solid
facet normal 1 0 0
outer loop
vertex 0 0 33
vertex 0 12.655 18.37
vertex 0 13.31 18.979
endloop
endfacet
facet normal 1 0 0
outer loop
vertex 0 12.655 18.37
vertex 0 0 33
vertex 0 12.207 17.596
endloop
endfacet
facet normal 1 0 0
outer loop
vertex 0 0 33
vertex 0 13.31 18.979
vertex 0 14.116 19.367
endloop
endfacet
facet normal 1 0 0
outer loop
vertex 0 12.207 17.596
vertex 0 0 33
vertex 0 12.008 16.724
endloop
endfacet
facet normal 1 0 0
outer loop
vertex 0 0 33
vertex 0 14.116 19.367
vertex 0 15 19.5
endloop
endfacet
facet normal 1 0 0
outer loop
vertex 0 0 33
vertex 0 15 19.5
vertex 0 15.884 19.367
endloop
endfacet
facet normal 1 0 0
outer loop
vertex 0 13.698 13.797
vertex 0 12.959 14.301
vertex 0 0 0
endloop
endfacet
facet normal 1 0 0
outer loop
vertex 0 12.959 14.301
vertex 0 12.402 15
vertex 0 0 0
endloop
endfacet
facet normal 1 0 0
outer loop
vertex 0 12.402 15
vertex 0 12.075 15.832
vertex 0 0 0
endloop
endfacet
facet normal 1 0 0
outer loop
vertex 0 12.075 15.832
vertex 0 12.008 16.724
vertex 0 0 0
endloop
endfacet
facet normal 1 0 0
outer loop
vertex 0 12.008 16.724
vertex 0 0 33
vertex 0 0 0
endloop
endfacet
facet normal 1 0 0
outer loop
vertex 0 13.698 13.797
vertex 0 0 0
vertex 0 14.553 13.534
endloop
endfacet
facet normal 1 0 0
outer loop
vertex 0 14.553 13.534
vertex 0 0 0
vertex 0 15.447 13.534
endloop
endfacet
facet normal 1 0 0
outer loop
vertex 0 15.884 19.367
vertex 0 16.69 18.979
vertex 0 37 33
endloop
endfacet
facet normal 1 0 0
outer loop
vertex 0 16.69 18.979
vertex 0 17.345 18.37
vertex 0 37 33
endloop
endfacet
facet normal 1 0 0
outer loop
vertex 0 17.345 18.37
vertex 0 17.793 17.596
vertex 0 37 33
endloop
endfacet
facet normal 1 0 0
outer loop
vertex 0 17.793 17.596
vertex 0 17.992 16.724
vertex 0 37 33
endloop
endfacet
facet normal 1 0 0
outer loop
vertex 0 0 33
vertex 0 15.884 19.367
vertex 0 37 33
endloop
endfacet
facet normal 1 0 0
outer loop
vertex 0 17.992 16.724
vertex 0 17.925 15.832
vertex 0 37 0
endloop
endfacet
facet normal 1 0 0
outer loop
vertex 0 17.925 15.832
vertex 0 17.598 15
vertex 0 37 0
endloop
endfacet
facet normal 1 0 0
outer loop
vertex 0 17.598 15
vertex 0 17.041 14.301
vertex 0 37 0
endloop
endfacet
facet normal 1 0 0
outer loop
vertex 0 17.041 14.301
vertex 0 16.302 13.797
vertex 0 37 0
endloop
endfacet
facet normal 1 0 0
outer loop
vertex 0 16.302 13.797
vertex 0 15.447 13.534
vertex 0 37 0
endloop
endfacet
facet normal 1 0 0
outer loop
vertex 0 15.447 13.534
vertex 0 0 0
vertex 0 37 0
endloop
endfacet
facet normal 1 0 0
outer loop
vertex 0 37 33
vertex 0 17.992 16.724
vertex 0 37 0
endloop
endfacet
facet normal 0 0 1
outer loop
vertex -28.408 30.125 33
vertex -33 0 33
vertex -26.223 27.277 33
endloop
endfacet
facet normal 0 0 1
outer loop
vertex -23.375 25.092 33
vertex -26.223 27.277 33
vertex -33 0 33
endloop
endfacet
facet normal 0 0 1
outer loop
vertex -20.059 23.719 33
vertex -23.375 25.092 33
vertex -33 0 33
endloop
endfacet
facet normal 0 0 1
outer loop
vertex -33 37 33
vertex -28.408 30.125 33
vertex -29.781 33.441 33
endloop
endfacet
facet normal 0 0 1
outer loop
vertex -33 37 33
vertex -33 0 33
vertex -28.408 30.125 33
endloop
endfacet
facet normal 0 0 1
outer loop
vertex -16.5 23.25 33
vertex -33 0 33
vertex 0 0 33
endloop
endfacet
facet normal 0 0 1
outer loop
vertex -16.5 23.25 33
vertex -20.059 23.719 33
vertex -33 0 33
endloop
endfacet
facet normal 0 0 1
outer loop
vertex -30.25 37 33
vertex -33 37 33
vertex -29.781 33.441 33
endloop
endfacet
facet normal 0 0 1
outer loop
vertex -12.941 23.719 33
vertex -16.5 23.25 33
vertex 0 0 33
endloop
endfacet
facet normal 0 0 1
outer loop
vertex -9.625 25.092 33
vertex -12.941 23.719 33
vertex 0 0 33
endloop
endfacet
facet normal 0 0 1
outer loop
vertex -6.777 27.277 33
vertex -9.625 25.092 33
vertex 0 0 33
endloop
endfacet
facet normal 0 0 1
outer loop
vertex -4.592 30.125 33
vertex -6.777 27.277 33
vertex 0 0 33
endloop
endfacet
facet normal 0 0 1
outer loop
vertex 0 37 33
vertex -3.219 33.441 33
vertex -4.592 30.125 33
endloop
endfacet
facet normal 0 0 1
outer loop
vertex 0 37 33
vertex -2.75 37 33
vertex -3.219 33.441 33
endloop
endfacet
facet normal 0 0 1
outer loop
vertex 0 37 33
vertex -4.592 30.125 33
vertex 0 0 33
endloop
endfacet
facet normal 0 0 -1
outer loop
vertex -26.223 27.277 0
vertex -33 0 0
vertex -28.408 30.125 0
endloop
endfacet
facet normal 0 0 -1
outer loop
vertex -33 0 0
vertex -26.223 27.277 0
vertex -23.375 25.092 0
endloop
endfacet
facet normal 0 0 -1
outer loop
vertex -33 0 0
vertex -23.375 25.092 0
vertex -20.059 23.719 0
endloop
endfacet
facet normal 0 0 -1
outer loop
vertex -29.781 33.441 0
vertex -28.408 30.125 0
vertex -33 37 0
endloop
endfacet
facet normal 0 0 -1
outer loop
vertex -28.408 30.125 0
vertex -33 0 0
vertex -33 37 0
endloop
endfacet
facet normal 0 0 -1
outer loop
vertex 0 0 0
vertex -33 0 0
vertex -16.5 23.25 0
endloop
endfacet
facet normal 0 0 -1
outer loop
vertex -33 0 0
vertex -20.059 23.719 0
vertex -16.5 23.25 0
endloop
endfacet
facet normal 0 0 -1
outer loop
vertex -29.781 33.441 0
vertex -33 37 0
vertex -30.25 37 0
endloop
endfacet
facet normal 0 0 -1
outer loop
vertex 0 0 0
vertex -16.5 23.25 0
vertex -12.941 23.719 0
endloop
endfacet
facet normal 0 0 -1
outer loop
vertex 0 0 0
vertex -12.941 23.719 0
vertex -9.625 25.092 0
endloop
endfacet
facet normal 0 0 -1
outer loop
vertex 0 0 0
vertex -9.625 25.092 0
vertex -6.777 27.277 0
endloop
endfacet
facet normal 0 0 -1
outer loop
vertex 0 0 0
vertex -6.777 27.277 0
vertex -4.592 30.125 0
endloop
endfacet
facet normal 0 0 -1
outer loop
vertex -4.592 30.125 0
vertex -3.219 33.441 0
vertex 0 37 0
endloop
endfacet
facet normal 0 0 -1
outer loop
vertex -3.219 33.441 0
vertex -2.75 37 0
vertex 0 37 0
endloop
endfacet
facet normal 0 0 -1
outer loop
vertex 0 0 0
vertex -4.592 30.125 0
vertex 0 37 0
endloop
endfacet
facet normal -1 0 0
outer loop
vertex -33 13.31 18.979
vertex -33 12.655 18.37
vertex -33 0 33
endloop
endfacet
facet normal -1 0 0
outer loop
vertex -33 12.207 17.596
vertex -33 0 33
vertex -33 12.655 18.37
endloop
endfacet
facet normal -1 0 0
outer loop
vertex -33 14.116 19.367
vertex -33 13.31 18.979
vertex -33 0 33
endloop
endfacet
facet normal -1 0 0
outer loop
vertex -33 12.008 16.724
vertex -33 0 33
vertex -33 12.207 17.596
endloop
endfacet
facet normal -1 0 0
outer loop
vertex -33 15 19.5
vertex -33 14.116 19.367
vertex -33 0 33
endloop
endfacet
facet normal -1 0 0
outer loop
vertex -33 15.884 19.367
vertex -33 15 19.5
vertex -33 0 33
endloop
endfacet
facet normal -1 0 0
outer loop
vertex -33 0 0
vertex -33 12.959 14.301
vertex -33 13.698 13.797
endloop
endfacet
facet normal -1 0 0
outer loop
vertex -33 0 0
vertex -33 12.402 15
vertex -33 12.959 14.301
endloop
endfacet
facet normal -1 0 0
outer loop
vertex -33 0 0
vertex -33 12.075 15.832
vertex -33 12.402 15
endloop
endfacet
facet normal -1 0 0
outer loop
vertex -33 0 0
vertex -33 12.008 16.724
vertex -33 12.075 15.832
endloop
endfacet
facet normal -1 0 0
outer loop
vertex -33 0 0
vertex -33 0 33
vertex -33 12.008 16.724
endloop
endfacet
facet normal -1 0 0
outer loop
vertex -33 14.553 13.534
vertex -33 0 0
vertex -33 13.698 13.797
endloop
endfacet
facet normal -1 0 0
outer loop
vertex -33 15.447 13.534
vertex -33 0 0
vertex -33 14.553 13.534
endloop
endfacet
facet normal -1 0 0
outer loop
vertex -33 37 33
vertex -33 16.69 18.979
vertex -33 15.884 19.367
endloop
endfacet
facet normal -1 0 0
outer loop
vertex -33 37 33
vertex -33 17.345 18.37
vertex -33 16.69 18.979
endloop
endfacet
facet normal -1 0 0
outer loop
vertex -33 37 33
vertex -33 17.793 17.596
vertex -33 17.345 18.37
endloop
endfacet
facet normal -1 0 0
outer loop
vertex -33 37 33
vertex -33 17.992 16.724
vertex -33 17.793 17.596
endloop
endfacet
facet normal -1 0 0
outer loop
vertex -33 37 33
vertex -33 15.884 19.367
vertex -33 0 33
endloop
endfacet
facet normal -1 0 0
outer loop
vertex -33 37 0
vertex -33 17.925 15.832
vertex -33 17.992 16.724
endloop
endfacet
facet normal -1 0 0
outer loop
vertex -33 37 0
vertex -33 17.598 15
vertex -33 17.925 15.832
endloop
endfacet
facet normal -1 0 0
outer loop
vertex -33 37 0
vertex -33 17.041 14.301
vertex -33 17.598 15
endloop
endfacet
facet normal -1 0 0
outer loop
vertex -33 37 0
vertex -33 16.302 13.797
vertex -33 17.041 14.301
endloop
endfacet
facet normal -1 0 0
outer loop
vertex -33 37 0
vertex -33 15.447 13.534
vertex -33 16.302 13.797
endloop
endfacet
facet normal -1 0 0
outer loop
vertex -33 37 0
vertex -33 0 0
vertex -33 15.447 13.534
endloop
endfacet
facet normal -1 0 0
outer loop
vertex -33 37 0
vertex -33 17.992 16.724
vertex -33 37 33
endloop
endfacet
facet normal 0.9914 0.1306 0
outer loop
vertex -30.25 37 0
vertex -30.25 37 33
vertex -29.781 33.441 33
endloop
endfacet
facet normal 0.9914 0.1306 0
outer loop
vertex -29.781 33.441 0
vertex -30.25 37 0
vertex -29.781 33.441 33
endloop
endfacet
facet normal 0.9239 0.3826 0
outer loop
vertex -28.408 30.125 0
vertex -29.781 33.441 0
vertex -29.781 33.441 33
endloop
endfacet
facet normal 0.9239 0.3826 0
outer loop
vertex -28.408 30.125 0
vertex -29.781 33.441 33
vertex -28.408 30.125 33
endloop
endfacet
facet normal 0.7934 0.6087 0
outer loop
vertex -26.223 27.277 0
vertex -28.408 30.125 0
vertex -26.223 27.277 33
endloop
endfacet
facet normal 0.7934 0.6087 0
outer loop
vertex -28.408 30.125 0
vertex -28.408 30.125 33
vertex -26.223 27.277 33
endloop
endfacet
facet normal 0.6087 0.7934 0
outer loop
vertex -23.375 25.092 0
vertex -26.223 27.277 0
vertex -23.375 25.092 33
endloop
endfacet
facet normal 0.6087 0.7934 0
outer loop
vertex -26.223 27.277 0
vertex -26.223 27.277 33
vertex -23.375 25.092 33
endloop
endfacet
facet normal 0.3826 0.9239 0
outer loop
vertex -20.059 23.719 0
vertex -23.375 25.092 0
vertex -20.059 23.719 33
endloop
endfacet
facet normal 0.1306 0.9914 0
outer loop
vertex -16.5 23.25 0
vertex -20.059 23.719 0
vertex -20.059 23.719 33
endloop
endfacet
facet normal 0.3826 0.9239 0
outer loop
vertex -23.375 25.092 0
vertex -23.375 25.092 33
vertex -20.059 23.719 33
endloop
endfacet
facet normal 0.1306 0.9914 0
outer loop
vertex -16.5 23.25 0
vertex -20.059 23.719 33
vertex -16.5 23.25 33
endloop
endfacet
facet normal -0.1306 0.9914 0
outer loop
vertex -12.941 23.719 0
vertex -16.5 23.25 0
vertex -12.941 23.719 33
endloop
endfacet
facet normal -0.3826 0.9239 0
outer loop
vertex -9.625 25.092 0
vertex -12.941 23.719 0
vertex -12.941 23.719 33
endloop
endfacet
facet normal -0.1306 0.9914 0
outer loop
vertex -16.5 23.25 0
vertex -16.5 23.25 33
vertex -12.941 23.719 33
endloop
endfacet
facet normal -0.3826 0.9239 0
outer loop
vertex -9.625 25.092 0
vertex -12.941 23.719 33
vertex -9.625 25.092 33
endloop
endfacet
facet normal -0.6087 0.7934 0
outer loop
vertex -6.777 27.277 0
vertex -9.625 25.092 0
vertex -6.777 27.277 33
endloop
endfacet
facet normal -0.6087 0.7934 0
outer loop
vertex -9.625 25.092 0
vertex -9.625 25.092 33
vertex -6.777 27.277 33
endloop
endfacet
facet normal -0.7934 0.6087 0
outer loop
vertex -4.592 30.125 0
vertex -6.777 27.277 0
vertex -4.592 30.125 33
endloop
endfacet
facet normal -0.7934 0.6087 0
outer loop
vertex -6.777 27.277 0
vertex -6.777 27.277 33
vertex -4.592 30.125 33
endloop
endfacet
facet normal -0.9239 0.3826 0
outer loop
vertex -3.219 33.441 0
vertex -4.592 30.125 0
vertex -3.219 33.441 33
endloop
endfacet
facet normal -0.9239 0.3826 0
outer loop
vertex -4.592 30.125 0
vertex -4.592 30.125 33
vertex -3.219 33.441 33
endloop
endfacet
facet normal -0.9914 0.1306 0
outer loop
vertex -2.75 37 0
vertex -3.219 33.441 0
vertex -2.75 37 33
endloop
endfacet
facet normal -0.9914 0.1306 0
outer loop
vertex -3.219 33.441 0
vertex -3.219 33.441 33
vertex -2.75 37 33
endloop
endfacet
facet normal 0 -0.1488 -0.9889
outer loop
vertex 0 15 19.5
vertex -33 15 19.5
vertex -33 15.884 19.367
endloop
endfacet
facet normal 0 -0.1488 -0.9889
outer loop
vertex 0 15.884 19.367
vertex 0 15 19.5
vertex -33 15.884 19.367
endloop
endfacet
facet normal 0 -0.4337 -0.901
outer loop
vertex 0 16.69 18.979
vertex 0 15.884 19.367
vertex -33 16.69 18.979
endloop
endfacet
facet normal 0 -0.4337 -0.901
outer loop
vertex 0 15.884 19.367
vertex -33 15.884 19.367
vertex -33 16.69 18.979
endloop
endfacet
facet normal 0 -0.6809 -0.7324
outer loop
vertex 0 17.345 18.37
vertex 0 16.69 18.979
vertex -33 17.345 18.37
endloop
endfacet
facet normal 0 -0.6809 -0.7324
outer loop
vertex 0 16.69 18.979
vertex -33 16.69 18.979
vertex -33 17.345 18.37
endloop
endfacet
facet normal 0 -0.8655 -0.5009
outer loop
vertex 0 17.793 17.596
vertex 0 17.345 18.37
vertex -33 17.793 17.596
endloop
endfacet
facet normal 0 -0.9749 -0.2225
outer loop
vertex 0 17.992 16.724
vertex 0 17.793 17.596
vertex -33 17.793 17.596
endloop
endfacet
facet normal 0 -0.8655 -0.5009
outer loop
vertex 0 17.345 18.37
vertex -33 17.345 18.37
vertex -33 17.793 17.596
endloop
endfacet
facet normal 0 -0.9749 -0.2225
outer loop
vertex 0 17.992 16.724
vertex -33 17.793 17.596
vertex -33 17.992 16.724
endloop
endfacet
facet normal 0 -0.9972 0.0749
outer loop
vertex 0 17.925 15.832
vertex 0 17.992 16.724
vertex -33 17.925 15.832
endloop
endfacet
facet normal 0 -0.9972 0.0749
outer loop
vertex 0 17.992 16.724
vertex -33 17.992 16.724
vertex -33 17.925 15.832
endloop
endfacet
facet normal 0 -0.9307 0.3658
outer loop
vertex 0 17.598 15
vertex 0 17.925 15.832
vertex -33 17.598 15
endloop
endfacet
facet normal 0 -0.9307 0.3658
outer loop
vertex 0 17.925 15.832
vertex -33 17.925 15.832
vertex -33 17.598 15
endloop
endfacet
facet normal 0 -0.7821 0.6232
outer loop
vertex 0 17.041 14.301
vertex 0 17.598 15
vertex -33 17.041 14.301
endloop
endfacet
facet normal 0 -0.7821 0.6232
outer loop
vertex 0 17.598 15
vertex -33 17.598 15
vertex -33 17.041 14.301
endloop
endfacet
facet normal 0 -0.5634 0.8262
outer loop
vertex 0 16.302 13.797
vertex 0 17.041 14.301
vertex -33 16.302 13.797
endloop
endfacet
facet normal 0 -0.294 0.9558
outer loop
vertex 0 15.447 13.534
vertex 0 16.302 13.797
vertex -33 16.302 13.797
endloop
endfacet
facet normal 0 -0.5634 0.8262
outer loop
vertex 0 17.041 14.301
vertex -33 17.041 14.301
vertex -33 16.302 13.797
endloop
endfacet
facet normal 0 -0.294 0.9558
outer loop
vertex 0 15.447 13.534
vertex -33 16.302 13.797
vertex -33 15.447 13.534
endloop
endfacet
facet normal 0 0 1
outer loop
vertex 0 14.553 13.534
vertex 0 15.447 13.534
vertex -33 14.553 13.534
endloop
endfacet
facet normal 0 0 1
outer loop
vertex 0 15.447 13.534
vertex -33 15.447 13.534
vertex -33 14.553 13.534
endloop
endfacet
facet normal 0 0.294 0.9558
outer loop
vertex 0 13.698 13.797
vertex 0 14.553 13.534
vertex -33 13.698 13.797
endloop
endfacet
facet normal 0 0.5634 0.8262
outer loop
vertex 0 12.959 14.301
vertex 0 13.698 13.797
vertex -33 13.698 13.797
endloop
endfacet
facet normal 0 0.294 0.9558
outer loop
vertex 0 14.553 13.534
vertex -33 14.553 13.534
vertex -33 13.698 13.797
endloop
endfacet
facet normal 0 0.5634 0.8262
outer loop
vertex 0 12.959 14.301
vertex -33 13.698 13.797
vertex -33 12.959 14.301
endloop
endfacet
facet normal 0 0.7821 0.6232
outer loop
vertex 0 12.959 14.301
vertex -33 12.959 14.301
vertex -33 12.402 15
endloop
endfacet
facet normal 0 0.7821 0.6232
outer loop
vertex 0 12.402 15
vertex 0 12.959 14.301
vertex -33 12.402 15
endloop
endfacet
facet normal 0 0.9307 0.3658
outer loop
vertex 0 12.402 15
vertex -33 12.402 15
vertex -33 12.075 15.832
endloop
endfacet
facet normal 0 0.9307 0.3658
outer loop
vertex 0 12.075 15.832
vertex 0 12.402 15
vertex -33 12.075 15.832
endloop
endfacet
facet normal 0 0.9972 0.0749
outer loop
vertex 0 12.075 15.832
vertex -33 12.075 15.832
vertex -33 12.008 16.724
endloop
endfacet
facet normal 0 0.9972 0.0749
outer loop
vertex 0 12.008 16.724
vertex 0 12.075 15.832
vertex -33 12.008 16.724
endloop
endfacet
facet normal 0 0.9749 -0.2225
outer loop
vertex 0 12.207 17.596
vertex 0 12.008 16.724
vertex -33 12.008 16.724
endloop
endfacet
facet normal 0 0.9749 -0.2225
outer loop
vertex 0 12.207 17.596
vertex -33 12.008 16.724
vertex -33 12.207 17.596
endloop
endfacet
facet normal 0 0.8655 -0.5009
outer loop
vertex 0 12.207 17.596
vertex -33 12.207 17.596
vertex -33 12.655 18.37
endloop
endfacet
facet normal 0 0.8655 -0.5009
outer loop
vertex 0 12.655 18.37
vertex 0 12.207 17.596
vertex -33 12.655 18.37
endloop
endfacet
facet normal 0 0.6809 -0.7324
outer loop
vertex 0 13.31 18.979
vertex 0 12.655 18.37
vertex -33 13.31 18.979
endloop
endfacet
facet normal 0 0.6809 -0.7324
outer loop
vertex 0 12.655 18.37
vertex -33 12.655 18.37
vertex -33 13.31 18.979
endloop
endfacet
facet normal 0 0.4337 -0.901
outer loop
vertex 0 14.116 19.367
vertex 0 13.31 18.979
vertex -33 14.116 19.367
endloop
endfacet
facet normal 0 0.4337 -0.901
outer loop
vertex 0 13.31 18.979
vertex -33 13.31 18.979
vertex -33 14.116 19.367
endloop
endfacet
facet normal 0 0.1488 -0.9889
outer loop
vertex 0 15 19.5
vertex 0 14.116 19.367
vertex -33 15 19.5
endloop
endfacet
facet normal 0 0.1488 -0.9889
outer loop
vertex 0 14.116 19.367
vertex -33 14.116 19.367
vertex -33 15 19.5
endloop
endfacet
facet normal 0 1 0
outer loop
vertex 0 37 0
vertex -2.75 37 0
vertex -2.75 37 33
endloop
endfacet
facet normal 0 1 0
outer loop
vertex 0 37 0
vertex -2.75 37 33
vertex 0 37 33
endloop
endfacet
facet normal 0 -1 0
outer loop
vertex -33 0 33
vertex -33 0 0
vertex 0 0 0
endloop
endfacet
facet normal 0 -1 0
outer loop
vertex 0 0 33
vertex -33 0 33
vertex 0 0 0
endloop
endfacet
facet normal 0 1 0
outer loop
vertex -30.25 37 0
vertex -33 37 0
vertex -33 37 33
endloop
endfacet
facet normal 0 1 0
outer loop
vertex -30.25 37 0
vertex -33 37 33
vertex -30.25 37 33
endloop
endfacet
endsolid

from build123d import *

# Parameters (mm, degrees)
SKETCH1_W           = 33
SKETCH1_H           = 37
BOSS_EXTRUDE1_DEPTH = 33
SKETCH2_R           = 13.75
CUT_EXTRUDE1_DEPTH  = 33
SKETCH3_R           = 3
CUT_EXTRUDE2_DEPTH  = 33


with BuildPart() as part:
    # Sketch1 → Boss-Extrude1 (new body)
    with BuildSketch(Plane.XY):
        with Locations((-16.5, 18.5)):
            Rectangle(SKETCH1_W, SKETCH1_H)
    extrude(amount=BOSS_EXTRUDE1_DEPTH)

    # Sketch2 → Cut-Extrude1 (cut)
    with BuildSketch(Plane.XY.offset(33)):
        with Locations((-16.5, 37)):
            Circle(SKETCH2_R)
    extrude(amount=-CUT_EXTRUDE1_DEPTH, mode=Mode.SUBTRACT)

    # Sketch3 → Cut-Extrude2 (cut)
    with BuildSketch(Plane.ZY.offset(33)):
        with Locations((16.5, 15)):
            Circle(SKETCH3_R)
    extrude(amount=-CUT_EXTRUDE2_DEPTH, mode=Mode.SUBTRACT)


solid = part.part
